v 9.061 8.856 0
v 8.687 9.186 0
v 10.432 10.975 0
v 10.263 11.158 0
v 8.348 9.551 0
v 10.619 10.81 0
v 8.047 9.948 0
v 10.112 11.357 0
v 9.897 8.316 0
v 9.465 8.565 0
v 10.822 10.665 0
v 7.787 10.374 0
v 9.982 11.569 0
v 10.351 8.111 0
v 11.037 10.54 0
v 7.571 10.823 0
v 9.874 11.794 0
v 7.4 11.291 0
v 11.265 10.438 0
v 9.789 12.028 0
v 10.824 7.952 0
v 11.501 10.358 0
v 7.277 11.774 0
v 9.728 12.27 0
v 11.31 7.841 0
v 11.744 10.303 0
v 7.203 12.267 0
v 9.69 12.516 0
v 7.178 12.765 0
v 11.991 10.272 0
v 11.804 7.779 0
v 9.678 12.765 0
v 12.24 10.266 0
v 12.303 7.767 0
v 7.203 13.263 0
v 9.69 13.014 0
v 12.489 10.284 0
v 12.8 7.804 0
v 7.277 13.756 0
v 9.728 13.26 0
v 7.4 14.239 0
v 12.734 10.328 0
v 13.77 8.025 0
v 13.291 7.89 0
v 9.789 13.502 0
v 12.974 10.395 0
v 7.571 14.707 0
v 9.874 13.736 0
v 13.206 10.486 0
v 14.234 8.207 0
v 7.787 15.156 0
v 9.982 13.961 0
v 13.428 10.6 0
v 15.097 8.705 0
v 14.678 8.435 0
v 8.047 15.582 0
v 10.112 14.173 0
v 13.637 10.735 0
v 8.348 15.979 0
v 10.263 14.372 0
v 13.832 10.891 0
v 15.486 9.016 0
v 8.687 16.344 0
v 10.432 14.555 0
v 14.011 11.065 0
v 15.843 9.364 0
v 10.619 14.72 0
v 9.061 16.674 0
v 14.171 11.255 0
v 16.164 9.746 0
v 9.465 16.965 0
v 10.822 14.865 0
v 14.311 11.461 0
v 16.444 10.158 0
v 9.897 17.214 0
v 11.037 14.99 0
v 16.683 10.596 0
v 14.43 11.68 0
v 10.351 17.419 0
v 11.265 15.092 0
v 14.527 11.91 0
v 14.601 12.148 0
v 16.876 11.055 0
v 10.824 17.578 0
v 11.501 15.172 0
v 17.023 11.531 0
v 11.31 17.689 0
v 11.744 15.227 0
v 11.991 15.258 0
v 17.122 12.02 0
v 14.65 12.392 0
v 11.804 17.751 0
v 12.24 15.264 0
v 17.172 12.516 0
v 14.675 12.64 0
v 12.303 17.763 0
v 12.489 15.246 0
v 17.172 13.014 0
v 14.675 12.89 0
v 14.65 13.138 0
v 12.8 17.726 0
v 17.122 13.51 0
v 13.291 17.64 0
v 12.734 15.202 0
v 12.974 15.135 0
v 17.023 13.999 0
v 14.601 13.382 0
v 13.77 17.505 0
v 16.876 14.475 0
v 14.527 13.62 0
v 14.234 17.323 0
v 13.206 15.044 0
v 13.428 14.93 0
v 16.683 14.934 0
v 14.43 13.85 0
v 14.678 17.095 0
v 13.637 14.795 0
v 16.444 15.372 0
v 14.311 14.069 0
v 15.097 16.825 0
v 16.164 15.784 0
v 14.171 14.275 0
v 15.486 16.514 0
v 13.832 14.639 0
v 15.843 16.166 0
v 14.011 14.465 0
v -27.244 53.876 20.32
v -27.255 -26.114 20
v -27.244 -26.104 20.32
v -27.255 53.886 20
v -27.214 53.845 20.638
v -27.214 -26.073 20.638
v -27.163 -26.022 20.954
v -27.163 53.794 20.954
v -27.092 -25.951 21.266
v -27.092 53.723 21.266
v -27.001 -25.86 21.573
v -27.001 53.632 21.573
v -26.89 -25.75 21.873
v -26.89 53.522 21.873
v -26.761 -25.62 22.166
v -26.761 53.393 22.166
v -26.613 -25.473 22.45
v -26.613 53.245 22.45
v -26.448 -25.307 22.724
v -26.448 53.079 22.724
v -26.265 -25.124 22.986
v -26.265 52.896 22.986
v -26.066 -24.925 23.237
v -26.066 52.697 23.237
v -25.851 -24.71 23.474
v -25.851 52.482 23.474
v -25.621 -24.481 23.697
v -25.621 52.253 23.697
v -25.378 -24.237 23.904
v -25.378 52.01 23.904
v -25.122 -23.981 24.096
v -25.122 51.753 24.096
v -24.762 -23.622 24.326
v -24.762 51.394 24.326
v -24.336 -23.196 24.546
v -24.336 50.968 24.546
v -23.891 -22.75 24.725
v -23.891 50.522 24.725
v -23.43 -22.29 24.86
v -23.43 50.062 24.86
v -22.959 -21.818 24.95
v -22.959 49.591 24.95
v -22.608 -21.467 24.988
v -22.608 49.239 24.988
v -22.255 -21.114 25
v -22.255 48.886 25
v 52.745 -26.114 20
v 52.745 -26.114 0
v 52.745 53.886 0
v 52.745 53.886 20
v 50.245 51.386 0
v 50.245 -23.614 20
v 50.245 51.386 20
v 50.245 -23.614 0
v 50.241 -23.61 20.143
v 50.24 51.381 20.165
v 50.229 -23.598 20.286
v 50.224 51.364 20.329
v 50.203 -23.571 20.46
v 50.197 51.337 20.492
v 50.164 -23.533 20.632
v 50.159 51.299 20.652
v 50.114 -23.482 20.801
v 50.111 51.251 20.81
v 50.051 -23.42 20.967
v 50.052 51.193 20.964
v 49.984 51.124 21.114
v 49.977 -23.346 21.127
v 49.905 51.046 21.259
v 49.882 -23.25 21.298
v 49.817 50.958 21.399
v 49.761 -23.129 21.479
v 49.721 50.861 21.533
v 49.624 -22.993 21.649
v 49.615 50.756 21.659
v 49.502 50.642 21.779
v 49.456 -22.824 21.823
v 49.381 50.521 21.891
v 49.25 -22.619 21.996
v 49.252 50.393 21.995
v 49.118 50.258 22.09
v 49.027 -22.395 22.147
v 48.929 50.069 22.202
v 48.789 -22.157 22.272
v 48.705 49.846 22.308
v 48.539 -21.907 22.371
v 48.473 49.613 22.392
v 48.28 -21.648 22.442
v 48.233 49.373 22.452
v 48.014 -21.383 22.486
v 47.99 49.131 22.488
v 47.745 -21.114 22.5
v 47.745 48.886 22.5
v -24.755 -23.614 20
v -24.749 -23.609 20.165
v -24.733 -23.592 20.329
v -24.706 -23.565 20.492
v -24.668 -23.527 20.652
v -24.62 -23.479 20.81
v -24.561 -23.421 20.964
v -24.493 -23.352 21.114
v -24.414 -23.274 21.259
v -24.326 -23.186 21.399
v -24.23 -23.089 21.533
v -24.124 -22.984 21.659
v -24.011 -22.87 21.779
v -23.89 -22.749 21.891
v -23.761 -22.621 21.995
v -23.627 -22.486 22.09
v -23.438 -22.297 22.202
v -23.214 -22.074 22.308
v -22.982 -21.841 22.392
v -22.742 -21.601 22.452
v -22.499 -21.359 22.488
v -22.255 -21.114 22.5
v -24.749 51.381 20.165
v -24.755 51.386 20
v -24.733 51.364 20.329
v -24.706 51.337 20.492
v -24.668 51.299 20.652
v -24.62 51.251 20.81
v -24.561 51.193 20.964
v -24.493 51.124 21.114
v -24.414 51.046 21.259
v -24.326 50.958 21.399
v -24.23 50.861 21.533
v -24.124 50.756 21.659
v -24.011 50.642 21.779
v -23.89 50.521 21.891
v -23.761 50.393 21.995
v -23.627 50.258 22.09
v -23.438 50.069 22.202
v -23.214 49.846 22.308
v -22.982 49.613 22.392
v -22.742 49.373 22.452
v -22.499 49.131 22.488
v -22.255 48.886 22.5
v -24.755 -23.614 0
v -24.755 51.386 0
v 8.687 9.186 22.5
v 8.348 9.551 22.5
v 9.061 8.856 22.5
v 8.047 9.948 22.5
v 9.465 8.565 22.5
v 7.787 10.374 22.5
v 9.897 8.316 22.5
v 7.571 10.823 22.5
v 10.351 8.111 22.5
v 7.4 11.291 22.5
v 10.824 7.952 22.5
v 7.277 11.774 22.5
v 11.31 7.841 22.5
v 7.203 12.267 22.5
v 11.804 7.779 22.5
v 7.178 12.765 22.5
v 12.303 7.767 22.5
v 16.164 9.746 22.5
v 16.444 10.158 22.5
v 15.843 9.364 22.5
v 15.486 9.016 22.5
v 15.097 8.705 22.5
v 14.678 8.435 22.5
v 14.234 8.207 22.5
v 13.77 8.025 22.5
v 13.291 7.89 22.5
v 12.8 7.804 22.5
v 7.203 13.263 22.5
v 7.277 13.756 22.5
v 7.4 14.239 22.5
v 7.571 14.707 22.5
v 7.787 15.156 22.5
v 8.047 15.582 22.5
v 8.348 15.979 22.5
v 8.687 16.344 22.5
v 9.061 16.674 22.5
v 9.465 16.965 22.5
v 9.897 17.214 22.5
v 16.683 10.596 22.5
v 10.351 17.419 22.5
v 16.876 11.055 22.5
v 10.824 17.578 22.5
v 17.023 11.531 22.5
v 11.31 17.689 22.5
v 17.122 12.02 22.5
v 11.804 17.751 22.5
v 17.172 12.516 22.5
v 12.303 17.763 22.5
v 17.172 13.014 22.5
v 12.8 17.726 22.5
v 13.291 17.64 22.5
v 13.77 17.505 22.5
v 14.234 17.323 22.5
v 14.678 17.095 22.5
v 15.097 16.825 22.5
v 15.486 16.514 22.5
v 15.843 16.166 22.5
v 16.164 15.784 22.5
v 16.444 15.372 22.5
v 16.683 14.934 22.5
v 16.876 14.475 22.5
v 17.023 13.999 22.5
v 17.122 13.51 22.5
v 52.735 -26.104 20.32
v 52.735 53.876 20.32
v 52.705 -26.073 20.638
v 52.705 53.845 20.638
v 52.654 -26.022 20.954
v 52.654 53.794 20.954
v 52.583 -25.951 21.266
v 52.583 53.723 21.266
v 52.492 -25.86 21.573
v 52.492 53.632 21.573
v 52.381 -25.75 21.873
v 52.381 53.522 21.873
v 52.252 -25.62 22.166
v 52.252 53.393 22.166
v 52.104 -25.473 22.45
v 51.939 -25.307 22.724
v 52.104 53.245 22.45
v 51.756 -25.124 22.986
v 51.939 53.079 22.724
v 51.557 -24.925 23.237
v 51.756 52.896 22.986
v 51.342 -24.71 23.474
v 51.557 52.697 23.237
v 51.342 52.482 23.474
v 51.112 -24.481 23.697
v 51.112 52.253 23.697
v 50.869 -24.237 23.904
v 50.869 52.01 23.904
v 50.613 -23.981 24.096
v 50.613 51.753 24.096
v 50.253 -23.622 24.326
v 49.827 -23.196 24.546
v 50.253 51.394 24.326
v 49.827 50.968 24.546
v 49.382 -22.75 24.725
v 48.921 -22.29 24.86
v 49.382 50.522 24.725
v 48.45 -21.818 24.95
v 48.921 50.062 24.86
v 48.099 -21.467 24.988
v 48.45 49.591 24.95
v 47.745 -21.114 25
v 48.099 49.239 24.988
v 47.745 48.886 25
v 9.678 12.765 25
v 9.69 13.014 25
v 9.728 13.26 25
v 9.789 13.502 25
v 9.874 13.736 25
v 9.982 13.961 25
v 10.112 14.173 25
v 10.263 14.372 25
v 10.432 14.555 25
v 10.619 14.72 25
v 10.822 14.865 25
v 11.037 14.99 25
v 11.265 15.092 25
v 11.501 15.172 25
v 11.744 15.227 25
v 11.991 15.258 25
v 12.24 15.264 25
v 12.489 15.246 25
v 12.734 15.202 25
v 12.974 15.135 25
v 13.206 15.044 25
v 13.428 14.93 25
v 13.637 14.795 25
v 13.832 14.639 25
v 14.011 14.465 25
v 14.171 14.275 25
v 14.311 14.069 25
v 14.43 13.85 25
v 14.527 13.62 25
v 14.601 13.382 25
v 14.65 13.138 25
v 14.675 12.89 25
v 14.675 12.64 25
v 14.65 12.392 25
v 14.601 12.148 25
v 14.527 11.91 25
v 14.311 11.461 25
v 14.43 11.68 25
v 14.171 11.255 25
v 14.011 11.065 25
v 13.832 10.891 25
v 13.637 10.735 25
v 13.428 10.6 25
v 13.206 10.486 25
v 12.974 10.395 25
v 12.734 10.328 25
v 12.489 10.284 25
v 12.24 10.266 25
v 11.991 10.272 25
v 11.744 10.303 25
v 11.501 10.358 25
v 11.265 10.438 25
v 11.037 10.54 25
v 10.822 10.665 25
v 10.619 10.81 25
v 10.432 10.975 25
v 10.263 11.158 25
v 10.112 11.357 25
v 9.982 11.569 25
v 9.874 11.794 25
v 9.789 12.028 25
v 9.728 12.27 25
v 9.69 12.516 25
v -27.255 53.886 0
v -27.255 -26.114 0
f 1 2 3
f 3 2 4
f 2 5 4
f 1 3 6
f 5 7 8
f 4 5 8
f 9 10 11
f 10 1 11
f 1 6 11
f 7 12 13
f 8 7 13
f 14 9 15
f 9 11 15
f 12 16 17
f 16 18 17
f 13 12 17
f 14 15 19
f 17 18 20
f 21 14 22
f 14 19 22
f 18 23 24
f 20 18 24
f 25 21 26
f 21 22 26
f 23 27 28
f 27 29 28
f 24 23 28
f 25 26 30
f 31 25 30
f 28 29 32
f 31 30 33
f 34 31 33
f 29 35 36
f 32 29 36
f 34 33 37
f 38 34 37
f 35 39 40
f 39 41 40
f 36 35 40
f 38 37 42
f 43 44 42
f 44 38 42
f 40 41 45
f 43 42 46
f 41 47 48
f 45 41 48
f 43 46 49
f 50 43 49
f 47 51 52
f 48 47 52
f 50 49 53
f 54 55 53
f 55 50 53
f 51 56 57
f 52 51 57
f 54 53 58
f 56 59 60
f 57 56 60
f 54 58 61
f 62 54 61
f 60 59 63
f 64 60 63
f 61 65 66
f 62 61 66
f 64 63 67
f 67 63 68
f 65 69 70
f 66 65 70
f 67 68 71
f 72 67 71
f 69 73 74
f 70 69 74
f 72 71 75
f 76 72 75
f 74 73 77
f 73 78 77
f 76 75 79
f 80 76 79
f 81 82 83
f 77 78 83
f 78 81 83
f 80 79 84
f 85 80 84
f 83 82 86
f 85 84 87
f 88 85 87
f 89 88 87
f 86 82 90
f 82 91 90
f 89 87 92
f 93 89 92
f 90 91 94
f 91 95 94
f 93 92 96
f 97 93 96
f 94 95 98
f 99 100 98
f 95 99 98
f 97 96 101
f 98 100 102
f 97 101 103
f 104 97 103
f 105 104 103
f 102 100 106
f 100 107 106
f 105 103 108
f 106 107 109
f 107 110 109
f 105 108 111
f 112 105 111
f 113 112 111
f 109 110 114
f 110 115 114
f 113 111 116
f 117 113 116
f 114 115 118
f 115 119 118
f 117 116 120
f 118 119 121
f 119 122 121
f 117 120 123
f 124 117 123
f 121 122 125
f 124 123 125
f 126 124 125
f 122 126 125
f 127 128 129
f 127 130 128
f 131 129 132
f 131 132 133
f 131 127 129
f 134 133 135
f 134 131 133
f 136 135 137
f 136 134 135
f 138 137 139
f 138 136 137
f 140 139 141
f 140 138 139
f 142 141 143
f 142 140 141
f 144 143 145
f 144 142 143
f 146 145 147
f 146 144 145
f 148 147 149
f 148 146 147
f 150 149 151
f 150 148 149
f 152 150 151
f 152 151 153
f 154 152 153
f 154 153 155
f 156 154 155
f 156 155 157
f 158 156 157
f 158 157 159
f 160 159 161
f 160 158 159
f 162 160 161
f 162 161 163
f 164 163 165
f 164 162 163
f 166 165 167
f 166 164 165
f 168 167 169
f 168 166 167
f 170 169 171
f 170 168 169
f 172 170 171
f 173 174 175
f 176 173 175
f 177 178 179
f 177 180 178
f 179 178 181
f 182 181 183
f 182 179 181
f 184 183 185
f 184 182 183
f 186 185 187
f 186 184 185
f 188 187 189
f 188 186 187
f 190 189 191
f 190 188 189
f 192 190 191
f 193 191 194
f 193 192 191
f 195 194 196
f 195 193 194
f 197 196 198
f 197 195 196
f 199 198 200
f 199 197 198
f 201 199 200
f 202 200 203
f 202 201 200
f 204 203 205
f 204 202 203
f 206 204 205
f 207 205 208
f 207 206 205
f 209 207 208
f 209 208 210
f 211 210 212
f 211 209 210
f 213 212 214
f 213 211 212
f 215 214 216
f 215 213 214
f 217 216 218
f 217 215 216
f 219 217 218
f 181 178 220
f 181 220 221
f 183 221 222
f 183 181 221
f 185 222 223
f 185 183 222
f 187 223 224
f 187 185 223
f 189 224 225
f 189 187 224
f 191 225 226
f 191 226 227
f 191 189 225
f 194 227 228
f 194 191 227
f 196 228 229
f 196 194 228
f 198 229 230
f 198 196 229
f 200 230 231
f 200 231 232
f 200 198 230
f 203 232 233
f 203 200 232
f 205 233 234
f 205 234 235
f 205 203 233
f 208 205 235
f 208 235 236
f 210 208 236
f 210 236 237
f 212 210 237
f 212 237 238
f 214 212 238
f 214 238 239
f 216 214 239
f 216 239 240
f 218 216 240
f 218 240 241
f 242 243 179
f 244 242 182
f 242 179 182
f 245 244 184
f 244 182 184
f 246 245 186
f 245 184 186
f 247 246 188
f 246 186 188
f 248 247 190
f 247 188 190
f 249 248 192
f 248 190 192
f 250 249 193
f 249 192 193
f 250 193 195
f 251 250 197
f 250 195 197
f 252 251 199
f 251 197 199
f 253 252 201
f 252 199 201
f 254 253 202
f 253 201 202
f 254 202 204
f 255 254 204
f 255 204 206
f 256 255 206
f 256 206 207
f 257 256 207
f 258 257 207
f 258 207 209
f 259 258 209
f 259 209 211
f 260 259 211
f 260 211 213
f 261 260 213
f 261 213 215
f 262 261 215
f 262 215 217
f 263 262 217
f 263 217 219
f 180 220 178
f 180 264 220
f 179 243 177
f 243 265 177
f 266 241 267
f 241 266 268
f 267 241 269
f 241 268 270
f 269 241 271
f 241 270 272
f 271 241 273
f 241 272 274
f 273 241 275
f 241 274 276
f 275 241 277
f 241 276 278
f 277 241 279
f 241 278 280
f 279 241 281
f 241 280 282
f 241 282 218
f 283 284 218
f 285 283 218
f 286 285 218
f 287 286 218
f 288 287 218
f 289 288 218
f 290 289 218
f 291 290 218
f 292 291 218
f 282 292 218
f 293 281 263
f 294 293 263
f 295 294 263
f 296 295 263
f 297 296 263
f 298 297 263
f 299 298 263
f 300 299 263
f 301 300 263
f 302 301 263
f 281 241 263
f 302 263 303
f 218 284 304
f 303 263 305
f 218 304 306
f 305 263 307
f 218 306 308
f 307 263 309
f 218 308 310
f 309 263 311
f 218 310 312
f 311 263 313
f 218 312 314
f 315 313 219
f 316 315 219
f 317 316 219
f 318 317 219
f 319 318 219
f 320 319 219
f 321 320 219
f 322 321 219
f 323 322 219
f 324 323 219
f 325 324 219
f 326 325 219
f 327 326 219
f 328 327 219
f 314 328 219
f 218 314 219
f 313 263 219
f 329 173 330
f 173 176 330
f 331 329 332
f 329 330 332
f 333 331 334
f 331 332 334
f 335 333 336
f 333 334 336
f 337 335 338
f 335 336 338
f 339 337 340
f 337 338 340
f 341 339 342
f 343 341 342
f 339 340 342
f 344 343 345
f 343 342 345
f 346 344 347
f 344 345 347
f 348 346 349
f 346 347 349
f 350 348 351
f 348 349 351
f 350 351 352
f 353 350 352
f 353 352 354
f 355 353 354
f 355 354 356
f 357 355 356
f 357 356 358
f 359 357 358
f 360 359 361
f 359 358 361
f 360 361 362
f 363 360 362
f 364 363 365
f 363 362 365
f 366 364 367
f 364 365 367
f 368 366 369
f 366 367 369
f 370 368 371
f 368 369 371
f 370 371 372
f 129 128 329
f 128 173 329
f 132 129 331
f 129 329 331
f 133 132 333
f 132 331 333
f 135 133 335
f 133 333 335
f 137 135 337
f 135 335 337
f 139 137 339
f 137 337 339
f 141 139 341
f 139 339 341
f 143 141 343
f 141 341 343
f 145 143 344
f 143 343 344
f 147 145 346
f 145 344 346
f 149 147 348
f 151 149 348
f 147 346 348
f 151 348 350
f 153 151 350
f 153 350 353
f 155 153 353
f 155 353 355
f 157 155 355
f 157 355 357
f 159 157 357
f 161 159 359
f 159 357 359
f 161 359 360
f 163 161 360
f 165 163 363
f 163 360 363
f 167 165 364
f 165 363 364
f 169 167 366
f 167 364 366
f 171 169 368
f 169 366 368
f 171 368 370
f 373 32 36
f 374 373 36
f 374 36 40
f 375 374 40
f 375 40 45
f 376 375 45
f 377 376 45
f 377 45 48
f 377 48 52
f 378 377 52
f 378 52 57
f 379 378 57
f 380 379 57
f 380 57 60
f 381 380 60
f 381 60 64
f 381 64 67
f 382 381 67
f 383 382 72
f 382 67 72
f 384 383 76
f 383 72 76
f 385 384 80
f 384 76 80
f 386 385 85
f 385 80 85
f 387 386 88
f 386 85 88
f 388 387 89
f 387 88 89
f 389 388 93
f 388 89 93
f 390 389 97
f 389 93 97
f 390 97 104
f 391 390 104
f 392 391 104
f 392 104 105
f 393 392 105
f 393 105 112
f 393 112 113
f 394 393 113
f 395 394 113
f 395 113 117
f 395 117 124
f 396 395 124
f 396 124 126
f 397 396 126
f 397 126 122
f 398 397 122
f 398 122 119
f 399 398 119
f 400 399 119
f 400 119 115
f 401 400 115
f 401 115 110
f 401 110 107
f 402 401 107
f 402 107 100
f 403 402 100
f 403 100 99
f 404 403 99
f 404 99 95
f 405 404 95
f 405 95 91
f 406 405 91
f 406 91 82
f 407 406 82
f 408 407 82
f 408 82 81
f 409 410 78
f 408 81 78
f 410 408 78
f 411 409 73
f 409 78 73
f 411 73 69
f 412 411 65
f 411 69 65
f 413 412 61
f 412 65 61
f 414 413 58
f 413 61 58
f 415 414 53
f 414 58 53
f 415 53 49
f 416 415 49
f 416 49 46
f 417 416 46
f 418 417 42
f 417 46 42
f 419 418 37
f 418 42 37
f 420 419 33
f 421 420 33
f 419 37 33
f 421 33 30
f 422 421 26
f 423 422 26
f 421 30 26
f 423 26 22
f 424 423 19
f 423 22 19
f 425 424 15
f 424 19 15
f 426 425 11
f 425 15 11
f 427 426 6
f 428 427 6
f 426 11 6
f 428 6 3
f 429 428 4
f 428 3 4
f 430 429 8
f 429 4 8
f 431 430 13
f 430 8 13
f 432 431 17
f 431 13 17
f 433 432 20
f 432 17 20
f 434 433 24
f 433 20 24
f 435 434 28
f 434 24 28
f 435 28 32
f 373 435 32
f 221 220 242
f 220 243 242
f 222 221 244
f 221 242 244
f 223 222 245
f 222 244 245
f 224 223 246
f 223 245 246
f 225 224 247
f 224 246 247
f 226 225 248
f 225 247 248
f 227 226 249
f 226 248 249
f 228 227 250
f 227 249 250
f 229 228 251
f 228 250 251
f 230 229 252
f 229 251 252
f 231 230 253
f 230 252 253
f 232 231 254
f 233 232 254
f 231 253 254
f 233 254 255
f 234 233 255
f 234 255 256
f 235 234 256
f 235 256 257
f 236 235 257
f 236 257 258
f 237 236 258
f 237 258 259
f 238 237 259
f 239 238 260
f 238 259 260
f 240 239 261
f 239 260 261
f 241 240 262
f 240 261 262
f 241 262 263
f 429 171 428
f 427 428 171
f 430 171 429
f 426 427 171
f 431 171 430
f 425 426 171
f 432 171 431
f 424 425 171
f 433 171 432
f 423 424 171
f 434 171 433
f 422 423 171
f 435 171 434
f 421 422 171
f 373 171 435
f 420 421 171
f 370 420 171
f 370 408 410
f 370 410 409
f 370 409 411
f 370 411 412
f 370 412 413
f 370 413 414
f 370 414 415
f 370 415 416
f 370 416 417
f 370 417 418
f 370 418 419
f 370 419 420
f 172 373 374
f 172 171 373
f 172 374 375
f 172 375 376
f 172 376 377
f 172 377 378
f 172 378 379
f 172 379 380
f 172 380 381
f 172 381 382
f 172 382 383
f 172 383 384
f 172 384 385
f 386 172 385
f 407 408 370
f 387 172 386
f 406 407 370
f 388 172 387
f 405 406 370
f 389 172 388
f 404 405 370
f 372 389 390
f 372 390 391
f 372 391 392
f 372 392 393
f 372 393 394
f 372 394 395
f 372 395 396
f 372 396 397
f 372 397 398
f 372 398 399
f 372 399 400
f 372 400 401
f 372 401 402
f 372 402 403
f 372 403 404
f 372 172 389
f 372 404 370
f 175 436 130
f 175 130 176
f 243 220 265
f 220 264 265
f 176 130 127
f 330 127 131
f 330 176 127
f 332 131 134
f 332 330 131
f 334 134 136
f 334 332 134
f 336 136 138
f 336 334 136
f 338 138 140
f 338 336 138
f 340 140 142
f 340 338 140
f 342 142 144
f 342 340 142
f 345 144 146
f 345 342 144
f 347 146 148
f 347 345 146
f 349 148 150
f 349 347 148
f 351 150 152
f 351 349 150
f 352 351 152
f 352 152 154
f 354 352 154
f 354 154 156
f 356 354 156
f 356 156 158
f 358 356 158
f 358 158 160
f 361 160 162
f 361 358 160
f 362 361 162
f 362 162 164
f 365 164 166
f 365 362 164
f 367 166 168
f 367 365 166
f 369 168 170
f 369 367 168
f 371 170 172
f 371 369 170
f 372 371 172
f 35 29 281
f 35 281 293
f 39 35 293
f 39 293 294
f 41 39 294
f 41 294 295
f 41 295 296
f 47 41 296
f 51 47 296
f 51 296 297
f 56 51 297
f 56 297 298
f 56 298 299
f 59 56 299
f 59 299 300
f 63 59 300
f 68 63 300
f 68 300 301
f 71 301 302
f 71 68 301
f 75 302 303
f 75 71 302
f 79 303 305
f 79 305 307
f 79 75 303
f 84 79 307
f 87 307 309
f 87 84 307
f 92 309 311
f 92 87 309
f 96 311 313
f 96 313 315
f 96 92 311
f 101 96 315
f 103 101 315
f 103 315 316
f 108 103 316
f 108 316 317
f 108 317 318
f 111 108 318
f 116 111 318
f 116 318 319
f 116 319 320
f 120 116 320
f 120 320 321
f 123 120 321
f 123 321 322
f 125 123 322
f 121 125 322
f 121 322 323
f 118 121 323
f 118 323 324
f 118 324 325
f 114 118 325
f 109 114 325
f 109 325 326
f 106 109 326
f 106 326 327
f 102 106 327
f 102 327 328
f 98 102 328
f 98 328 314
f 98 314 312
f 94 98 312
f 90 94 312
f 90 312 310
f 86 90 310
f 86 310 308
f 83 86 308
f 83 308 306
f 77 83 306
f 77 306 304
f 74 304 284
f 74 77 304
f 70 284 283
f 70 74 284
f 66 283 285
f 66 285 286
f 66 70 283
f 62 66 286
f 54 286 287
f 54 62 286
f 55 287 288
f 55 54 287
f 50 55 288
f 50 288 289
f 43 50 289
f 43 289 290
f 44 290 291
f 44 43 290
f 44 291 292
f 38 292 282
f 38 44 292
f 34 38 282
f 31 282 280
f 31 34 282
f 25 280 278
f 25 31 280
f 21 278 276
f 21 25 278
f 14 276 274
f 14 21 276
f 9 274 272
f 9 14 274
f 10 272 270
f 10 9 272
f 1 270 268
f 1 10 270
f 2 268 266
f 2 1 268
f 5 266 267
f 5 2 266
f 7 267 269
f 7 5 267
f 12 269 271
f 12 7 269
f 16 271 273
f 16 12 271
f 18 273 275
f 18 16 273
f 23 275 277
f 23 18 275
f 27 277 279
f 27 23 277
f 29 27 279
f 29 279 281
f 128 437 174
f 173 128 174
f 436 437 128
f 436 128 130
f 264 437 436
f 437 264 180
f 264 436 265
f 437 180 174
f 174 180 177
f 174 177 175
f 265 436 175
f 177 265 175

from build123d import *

# Parameters (mm, degrees)
F0_W     = 80
F0_H     = 80
F1_DEPTH = 25
F2_R     = 5
F4_D     = 5
F5_T     = -2.5


with BuildPart() as f1:
    # F0 (on Top) → F1 (new body)
    with BuildSketch(Plane.XY):
        with Locations((12.7454949915, 13.8860409707)):
            Rectangle(F0_W, F0_H)
    extrude(amount=F1_DEPTH)

    # F2
    f2_edges = [f1.edges().sort_by_distance(p)[0] for p in [
        (52.745495, 13.886041, 25),
        (12.745495, -26.113959, 25),
        (-27.254505, 13.886041, 25),
        (12.745495, 53.886041, 25),
    ]]
    fillet(f2_edges, radius=F2_R)

    # F4 (through all)
    with Locations(Plane.XY.offset(25)):
        with Locations((12.1779767796, 12.7649977803)):
            Hole(F4_D / 2)

    # F5
    f5_openings = [f1.faces().sort_by_distance(p)[0] for p in [
        (-26.123134, 13.886041, 0),
    ]]
    offset(amount=F5_T, openings=f5_openings)


solid = f1.part
